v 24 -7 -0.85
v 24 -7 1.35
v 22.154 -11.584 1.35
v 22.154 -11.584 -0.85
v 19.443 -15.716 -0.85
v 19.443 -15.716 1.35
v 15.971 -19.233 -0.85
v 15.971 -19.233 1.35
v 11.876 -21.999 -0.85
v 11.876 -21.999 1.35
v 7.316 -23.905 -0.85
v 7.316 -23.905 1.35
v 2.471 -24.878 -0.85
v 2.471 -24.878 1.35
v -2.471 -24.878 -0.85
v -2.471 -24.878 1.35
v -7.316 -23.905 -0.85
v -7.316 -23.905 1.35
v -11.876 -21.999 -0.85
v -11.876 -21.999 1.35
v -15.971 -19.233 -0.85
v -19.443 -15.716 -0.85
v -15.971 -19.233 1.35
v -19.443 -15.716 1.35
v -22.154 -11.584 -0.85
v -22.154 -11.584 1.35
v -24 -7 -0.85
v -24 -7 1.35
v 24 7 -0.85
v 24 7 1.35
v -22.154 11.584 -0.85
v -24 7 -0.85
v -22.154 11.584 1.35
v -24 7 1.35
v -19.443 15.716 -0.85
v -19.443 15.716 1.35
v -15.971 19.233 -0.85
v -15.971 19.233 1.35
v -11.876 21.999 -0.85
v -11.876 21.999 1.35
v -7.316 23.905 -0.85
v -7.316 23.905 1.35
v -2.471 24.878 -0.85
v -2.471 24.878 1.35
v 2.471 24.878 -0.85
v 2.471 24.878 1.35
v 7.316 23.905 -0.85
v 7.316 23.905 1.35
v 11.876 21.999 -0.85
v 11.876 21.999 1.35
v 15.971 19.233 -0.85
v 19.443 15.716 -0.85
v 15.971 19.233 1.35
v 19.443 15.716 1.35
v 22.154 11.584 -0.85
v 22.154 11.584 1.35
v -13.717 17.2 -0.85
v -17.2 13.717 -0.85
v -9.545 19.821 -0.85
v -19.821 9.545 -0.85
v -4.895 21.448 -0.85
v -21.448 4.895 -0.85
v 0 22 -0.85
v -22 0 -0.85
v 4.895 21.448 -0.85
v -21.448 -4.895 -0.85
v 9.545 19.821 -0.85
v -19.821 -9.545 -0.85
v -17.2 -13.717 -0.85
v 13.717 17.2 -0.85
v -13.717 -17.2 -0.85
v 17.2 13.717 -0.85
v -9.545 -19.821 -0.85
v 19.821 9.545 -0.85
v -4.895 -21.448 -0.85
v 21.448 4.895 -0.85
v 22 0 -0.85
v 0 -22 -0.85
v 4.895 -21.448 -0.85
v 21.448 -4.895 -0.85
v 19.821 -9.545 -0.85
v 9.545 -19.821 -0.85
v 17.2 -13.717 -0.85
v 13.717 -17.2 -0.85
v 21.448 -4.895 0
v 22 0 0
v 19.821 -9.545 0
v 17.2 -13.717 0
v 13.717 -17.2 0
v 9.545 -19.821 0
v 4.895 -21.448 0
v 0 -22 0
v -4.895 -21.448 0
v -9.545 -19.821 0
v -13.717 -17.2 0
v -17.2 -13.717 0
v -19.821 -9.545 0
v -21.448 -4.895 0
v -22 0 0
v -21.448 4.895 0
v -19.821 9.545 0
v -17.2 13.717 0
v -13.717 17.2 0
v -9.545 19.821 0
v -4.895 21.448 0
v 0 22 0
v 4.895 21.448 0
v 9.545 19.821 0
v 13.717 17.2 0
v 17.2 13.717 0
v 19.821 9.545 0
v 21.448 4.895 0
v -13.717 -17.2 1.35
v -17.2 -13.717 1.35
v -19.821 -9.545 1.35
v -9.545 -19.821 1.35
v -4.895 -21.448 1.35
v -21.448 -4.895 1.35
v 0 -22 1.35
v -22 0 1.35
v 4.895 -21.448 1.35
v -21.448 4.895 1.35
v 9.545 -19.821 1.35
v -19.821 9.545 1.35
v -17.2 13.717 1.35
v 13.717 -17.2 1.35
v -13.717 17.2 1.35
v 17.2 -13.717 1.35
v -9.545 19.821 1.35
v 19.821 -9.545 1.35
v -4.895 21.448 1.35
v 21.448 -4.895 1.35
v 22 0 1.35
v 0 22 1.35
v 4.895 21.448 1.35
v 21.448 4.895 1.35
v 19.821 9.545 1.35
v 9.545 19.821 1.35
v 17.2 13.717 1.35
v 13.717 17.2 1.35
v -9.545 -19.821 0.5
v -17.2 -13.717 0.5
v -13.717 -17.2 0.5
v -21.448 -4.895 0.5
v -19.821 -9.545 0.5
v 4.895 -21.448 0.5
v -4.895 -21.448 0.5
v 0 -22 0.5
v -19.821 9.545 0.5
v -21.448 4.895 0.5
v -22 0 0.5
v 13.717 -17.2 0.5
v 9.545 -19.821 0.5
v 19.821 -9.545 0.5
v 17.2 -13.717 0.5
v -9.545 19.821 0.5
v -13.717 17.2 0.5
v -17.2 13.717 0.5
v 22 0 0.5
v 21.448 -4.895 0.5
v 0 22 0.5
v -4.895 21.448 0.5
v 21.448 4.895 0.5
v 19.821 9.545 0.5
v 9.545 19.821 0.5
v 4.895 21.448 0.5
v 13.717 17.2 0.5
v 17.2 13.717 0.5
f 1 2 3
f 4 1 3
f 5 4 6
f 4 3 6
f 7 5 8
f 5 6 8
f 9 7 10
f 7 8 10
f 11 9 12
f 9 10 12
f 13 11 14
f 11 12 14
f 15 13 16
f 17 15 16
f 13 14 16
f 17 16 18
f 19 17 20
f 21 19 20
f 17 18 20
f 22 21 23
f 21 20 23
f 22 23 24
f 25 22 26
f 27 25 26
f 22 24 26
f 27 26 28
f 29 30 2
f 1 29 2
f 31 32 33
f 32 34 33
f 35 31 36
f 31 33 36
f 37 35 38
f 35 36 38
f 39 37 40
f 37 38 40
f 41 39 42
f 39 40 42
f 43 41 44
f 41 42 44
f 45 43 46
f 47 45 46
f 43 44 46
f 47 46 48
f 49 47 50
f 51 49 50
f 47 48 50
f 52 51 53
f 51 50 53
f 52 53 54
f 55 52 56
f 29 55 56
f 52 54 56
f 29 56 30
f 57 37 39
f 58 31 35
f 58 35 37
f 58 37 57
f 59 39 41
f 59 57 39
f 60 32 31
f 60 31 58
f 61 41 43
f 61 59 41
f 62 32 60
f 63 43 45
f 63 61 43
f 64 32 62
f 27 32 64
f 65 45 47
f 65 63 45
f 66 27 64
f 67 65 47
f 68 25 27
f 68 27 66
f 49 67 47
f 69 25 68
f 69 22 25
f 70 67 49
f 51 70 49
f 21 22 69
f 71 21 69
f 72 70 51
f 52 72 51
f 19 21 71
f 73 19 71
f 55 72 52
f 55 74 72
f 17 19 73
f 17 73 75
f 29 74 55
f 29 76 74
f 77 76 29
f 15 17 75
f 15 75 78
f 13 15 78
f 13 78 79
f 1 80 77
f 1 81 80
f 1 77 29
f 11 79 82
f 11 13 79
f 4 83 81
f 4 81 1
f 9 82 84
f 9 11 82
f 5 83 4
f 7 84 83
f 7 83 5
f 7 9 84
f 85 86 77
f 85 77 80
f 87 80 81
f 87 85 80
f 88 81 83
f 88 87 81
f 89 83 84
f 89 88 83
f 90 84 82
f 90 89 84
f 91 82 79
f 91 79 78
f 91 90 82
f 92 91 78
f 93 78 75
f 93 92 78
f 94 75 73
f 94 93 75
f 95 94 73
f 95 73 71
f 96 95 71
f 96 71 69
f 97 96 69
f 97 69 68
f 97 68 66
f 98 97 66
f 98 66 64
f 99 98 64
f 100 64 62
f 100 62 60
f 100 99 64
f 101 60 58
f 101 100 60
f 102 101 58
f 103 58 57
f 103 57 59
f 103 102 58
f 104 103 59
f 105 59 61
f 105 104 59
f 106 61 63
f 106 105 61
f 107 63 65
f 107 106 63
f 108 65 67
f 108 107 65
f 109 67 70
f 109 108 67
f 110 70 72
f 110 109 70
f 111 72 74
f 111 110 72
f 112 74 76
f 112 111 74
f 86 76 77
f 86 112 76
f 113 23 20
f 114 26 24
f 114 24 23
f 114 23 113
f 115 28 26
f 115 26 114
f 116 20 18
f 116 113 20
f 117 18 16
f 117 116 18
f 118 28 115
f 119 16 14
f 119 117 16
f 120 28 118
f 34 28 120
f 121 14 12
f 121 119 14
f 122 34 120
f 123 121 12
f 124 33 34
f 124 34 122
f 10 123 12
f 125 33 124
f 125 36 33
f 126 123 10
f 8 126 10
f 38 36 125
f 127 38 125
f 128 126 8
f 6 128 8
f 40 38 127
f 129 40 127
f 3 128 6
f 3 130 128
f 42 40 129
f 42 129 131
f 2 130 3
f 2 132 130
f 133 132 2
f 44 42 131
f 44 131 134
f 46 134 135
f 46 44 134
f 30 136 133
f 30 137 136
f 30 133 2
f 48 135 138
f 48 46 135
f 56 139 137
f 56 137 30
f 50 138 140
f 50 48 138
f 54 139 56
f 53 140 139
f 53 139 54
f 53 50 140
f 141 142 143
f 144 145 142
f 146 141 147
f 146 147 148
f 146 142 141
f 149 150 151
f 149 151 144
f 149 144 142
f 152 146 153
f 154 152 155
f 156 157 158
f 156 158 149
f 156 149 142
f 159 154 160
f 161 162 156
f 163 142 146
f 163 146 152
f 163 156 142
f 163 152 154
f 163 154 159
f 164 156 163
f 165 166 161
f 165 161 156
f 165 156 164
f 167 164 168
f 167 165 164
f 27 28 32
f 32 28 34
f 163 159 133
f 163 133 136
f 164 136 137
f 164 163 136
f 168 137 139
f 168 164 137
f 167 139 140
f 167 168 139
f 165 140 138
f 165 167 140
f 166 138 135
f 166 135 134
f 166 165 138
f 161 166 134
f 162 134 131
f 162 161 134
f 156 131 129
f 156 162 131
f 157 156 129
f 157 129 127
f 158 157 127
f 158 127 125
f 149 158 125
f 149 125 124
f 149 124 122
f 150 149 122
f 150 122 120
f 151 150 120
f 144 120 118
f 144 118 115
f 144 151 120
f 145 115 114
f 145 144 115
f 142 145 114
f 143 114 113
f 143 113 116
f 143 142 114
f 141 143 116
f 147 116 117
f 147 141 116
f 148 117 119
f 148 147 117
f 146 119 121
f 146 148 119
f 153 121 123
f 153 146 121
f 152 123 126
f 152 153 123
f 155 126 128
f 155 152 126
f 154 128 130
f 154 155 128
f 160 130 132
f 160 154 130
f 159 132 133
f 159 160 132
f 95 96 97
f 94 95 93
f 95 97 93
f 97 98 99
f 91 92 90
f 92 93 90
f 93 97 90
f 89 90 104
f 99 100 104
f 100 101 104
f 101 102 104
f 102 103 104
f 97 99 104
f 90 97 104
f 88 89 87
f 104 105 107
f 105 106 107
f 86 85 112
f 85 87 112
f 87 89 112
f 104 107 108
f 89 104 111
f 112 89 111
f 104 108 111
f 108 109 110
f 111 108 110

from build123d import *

# Parameters (mm, degrees)
F1_DEPTH = 0.5
F2_R     = 22
F3_DEPTH = 0.85
F4_R     = 22
F5_DEPTH = 0.85


with BuildPart() as f1:
    # F0 (on Top) → F1 (new body)
    with BuildSketch(Plane.XY):
        with BuildLine():
            Line((24, -7), (24, 7))
            ThreePointArc((24, 7), (0, 25), (-24, 7))
            Line((-24, 7), (-24, -7))
            ThreePointArc((-24, -7), (0, -25), (24, -7))
        make_face()
    extrude(amount=F1_DEPTH)

    # F2 (on face) → F3 (join)
    with BuildSketch(Plane.XY.offset(0.5)):
        with BuildLine():
            ThreePointArc((-24, -7), (0, -25), (24, -7))
            Line((24, -7), (24, 7))
            ThreePointArc((24, 7), (0, 25), (-24, 7))
            Line((-24, 7), (-24, -7))
        make_face()
        Circle(F2_R, mode=Mode.SUBTRACT)
    extrude(amount=F3_DEPTH)

    # F4 (on face) → F5 (join)
    with BuildSketch(Plane(origin=(0, 0, 0), x_dir=(1, 0, 0), z_dir=(0, 0, -1))):
        with BuildLine():
            ThreePointArc((24, 7), (0, 25), (-24, 7))
            Line((-24, 7), (-24, -7))
            ThreePointArc((-24, -7), (0, -25), (24, -7))
            Line((24, -7), (24, 7))
        make_face()
        Circle(F4_R, mode=Mode.SUBTRACT)
    extrude(amount=F5_DEPTH)


solid = f1.part
